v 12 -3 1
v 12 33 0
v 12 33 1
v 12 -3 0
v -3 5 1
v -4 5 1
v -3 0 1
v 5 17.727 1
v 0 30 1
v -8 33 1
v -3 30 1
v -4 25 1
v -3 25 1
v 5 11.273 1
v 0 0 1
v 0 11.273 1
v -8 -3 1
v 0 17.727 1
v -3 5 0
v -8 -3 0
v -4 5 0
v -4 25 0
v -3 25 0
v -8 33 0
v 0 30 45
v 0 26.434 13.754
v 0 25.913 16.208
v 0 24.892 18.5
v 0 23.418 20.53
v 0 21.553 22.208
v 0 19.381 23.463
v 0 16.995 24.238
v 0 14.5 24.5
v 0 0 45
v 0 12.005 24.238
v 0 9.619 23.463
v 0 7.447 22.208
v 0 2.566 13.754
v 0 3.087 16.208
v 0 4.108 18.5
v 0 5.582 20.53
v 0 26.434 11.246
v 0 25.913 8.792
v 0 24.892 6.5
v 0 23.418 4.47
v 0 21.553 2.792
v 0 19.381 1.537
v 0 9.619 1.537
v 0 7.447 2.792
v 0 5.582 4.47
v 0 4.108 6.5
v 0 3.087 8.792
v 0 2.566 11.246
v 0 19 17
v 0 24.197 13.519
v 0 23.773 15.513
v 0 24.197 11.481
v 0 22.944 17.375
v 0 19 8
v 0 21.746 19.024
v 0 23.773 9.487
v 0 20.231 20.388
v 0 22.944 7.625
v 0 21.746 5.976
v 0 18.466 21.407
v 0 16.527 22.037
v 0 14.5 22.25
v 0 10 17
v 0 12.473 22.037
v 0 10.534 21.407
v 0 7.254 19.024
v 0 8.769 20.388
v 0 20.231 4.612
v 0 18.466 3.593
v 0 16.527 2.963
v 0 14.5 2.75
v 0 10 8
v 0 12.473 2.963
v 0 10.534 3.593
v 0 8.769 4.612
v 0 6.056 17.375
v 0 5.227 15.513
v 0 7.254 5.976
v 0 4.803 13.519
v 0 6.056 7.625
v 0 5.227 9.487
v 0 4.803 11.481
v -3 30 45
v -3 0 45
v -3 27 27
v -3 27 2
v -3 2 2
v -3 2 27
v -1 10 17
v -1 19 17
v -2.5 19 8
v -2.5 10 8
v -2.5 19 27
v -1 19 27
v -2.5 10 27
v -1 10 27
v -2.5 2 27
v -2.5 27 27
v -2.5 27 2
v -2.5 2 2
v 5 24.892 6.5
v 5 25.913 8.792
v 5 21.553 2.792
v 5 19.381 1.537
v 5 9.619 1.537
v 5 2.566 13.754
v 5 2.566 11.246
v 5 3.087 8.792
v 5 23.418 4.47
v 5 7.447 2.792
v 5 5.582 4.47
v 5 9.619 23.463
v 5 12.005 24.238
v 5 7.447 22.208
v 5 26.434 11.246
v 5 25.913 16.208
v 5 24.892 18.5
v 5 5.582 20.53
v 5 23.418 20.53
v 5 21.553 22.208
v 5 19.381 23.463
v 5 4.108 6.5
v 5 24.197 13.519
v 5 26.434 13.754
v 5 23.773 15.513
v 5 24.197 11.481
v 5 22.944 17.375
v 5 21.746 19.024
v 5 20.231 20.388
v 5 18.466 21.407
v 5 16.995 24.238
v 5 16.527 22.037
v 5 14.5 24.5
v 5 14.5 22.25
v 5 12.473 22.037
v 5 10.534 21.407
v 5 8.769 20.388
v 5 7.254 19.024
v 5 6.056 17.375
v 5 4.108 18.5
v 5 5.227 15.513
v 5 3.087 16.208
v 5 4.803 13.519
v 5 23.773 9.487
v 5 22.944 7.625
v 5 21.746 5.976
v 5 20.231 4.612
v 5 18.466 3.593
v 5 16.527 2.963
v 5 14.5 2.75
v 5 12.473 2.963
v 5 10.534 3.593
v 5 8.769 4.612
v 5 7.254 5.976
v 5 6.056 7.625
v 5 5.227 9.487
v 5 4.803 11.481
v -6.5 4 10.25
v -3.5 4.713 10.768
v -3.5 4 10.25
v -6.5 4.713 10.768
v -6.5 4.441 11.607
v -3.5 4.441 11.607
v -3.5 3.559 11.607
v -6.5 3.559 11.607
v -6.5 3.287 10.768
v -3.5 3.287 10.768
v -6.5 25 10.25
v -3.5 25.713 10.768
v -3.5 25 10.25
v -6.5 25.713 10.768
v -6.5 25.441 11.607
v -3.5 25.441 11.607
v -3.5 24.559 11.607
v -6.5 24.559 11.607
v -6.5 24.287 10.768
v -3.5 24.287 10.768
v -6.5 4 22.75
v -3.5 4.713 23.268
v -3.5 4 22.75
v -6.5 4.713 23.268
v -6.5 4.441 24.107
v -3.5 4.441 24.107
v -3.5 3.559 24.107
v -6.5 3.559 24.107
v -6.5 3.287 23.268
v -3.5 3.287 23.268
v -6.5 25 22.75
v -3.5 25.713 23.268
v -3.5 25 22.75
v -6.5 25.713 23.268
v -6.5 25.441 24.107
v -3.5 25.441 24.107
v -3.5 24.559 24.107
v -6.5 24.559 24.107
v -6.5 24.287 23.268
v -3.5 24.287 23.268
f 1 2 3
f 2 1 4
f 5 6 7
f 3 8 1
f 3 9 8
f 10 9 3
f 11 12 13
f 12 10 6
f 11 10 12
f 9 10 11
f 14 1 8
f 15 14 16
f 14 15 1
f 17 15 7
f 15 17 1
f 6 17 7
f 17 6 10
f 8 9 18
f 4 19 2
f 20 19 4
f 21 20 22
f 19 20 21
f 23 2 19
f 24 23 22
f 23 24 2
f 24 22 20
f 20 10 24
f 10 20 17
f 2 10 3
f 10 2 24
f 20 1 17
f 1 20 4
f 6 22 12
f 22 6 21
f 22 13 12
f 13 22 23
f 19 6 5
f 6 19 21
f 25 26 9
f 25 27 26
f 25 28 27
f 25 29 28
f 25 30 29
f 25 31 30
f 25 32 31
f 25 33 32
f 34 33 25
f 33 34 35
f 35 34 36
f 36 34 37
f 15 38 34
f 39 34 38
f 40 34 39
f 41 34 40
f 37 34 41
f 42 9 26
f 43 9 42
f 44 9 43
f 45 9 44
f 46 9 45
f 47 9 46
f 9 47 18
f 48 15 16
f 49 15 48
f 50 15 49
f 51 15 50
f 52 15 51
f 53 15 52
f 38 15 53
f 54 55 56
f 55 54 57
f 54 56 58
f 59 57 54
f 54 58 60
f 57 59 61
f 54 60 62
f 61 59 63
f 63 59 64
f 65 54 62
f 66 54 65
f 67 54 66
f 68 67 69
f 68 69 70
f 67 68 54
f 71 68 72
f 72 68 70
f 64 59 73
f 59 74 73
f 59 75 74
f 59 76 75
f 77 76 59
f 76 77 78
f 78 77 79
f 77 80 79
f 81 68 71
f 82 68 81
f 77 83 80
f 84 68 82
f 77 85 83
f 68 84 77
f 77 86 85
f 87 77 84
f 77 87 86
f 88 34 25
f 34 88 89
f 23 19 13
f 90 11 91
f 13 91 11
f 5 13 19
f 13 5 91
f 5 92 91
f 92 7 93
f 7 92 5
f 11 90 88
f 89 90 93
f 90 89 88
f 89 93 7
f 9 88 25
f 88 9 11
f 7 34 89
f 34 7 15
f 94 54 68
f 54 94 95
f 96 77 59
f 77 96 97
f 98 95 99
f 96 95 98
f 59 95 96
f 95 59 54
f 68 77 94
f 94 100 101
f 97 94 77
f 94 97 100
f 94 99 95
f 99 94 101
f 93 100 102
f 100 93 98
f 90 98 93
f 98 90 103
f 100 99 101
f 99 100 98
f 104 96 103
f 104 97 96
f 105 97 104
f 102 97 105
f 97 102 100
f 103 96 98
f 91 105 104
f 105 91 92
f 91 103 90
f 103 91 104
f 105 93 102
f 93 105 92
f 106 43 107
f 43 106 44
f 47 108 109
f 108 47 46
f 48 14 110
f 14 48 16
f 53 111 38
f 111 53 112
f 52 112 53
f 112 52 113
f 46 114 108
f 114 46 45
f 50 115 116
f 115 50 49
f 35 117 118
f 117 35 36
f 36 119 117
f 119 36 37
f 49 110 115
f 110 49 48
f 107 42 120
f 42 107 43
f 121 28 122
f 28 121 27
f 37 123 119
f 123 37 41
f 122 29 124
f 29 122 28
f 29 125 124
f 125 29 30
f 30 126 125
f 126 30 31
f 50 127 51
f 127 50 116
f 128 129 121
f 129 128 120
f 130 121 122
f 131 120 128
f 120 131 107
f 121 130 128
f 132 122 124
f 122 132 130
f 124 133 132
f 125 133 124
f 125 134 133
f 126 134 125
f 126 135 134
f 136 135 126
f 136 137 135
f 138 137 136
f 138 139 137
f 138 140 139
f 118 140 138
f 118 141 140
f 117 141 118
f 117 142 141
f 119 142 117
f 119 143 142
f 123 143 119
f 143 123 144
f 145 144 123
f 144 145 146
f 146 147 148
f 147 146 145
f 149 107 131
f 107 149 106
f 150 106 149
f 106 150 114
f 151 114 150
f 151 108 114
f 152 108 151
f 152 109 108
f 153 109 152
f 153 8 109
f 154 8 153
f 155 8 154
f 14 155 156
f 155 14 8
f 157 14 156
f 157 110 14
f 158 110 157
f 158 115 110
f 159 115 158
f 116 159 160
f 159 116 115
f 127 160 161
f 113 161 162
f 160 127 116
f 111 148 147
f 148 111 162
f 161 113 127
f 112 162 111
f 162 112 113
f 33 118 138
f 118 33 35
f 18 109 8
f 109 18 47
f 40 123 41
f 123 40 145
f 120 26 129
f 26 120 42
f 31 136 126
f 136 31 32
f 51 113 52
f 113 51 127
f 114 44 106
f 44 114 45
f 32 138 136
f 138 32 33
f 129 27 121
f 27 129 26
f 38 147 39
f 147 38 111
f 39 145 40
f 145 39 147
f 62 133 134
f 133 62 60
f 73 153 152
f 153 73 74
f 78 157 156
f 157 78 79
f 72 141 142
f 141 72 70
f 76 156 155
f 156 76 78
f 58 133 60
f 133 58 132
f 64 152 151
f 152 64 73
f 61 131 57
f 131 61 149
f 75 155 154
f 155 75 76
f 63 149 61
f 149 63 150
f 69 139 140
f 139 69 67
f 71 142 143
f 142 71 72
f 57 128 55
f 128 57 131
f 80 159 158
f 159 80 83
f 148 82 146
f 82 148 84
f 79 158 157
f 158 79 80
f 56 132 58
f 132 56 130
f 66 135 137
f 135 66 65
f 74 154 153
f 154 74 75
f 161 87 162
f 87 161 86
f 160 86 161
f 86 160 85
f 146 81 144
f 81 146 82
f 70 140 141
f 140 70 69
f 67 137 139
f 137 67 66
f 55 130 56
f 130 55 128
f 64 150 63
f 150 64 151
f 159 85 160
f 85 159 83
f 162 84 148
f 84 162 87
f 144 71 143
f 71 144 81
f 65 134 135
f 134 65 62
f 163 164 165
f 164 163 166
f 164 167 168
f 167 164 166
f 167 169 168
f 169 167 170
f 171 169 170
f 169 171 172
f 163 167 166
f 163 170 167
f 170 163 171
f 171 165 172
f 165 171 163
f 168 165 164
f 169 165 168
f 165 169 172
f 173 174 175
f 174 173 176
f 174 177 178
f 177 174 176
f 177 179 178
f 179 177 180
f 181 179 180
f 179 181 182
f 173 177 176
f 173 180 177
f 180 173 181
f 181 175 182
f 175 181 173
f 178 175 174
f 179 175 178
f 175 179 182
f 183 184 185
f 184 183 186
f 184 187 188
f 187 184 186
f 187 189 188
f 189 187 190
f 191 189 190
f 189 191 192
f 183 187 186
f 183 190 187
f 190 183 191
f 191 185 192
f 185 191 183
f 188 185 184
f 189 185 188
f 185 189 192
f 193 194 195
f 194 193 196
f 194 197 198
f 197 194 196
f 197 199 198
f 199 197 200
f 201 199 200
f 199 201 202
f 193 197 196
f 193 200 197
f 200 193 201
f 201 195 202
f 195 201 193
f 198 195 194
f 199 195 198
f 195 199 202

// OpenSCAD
//See 8mm-carriage.scad for documentation

TOTAL_WIDTH=30;
BORDER_WIDTH=3;
BORDER_HEIGHT=45;

//Base
difference() {
translate([-8,-3,0]){
cube([20,36,1]);
}
translate([-4,5,0]) {cube([3,20,3]);}
}

difference(){
//Main Structure
 translate([-BORDER_WIDTH,0,0]){
  cube([BORDER_WIDTH,TOTAL_WIDTH,BORDER_HEIGHT]);
 }

//Camera Opening
translate([-BORDER_WIDTH-1,10,8]){
   cube([9,9,9]);
  }
 
 translate([-BORDER_WIDTH-1,10,8]){
   cube([3,9,19]);
  }
  
//Camera Seating area  
  translate([-BORDER_WIDTH-1,2,2]){
   cube([BORDER_WIDTH/2,25,25]);
  }
}

//4 Posts
translate([-5,4,11]){
  rotate([0,90,0]){
   cylinder(h=3,r=0.75,center=true);
  }
 }

translate([-5,25,11]){
  rotate([0,90,0]){
   cylinder(h=3,r=0.75,center=true);
  }
 }
 
translate([-5,4,23.5]){
  rotate([0,90,0]){
   cylinder(h=3,r=0.75,center=true);
  }
 }

translate([-5,25,23.5]){
  rotate([0,90,0]){
   cylinder(h=3,r=0.75,center=true);
  }
 }

translate([2.5,14.5,12.5]){
  difference(){
  rotate([0,90,0]){
   cylinder(h=5,r=12, center=true);
  }
    rotate([0,90,0]){
   cylinder(h=6,r=9.75, center=true);
  }
 }
 }
 
